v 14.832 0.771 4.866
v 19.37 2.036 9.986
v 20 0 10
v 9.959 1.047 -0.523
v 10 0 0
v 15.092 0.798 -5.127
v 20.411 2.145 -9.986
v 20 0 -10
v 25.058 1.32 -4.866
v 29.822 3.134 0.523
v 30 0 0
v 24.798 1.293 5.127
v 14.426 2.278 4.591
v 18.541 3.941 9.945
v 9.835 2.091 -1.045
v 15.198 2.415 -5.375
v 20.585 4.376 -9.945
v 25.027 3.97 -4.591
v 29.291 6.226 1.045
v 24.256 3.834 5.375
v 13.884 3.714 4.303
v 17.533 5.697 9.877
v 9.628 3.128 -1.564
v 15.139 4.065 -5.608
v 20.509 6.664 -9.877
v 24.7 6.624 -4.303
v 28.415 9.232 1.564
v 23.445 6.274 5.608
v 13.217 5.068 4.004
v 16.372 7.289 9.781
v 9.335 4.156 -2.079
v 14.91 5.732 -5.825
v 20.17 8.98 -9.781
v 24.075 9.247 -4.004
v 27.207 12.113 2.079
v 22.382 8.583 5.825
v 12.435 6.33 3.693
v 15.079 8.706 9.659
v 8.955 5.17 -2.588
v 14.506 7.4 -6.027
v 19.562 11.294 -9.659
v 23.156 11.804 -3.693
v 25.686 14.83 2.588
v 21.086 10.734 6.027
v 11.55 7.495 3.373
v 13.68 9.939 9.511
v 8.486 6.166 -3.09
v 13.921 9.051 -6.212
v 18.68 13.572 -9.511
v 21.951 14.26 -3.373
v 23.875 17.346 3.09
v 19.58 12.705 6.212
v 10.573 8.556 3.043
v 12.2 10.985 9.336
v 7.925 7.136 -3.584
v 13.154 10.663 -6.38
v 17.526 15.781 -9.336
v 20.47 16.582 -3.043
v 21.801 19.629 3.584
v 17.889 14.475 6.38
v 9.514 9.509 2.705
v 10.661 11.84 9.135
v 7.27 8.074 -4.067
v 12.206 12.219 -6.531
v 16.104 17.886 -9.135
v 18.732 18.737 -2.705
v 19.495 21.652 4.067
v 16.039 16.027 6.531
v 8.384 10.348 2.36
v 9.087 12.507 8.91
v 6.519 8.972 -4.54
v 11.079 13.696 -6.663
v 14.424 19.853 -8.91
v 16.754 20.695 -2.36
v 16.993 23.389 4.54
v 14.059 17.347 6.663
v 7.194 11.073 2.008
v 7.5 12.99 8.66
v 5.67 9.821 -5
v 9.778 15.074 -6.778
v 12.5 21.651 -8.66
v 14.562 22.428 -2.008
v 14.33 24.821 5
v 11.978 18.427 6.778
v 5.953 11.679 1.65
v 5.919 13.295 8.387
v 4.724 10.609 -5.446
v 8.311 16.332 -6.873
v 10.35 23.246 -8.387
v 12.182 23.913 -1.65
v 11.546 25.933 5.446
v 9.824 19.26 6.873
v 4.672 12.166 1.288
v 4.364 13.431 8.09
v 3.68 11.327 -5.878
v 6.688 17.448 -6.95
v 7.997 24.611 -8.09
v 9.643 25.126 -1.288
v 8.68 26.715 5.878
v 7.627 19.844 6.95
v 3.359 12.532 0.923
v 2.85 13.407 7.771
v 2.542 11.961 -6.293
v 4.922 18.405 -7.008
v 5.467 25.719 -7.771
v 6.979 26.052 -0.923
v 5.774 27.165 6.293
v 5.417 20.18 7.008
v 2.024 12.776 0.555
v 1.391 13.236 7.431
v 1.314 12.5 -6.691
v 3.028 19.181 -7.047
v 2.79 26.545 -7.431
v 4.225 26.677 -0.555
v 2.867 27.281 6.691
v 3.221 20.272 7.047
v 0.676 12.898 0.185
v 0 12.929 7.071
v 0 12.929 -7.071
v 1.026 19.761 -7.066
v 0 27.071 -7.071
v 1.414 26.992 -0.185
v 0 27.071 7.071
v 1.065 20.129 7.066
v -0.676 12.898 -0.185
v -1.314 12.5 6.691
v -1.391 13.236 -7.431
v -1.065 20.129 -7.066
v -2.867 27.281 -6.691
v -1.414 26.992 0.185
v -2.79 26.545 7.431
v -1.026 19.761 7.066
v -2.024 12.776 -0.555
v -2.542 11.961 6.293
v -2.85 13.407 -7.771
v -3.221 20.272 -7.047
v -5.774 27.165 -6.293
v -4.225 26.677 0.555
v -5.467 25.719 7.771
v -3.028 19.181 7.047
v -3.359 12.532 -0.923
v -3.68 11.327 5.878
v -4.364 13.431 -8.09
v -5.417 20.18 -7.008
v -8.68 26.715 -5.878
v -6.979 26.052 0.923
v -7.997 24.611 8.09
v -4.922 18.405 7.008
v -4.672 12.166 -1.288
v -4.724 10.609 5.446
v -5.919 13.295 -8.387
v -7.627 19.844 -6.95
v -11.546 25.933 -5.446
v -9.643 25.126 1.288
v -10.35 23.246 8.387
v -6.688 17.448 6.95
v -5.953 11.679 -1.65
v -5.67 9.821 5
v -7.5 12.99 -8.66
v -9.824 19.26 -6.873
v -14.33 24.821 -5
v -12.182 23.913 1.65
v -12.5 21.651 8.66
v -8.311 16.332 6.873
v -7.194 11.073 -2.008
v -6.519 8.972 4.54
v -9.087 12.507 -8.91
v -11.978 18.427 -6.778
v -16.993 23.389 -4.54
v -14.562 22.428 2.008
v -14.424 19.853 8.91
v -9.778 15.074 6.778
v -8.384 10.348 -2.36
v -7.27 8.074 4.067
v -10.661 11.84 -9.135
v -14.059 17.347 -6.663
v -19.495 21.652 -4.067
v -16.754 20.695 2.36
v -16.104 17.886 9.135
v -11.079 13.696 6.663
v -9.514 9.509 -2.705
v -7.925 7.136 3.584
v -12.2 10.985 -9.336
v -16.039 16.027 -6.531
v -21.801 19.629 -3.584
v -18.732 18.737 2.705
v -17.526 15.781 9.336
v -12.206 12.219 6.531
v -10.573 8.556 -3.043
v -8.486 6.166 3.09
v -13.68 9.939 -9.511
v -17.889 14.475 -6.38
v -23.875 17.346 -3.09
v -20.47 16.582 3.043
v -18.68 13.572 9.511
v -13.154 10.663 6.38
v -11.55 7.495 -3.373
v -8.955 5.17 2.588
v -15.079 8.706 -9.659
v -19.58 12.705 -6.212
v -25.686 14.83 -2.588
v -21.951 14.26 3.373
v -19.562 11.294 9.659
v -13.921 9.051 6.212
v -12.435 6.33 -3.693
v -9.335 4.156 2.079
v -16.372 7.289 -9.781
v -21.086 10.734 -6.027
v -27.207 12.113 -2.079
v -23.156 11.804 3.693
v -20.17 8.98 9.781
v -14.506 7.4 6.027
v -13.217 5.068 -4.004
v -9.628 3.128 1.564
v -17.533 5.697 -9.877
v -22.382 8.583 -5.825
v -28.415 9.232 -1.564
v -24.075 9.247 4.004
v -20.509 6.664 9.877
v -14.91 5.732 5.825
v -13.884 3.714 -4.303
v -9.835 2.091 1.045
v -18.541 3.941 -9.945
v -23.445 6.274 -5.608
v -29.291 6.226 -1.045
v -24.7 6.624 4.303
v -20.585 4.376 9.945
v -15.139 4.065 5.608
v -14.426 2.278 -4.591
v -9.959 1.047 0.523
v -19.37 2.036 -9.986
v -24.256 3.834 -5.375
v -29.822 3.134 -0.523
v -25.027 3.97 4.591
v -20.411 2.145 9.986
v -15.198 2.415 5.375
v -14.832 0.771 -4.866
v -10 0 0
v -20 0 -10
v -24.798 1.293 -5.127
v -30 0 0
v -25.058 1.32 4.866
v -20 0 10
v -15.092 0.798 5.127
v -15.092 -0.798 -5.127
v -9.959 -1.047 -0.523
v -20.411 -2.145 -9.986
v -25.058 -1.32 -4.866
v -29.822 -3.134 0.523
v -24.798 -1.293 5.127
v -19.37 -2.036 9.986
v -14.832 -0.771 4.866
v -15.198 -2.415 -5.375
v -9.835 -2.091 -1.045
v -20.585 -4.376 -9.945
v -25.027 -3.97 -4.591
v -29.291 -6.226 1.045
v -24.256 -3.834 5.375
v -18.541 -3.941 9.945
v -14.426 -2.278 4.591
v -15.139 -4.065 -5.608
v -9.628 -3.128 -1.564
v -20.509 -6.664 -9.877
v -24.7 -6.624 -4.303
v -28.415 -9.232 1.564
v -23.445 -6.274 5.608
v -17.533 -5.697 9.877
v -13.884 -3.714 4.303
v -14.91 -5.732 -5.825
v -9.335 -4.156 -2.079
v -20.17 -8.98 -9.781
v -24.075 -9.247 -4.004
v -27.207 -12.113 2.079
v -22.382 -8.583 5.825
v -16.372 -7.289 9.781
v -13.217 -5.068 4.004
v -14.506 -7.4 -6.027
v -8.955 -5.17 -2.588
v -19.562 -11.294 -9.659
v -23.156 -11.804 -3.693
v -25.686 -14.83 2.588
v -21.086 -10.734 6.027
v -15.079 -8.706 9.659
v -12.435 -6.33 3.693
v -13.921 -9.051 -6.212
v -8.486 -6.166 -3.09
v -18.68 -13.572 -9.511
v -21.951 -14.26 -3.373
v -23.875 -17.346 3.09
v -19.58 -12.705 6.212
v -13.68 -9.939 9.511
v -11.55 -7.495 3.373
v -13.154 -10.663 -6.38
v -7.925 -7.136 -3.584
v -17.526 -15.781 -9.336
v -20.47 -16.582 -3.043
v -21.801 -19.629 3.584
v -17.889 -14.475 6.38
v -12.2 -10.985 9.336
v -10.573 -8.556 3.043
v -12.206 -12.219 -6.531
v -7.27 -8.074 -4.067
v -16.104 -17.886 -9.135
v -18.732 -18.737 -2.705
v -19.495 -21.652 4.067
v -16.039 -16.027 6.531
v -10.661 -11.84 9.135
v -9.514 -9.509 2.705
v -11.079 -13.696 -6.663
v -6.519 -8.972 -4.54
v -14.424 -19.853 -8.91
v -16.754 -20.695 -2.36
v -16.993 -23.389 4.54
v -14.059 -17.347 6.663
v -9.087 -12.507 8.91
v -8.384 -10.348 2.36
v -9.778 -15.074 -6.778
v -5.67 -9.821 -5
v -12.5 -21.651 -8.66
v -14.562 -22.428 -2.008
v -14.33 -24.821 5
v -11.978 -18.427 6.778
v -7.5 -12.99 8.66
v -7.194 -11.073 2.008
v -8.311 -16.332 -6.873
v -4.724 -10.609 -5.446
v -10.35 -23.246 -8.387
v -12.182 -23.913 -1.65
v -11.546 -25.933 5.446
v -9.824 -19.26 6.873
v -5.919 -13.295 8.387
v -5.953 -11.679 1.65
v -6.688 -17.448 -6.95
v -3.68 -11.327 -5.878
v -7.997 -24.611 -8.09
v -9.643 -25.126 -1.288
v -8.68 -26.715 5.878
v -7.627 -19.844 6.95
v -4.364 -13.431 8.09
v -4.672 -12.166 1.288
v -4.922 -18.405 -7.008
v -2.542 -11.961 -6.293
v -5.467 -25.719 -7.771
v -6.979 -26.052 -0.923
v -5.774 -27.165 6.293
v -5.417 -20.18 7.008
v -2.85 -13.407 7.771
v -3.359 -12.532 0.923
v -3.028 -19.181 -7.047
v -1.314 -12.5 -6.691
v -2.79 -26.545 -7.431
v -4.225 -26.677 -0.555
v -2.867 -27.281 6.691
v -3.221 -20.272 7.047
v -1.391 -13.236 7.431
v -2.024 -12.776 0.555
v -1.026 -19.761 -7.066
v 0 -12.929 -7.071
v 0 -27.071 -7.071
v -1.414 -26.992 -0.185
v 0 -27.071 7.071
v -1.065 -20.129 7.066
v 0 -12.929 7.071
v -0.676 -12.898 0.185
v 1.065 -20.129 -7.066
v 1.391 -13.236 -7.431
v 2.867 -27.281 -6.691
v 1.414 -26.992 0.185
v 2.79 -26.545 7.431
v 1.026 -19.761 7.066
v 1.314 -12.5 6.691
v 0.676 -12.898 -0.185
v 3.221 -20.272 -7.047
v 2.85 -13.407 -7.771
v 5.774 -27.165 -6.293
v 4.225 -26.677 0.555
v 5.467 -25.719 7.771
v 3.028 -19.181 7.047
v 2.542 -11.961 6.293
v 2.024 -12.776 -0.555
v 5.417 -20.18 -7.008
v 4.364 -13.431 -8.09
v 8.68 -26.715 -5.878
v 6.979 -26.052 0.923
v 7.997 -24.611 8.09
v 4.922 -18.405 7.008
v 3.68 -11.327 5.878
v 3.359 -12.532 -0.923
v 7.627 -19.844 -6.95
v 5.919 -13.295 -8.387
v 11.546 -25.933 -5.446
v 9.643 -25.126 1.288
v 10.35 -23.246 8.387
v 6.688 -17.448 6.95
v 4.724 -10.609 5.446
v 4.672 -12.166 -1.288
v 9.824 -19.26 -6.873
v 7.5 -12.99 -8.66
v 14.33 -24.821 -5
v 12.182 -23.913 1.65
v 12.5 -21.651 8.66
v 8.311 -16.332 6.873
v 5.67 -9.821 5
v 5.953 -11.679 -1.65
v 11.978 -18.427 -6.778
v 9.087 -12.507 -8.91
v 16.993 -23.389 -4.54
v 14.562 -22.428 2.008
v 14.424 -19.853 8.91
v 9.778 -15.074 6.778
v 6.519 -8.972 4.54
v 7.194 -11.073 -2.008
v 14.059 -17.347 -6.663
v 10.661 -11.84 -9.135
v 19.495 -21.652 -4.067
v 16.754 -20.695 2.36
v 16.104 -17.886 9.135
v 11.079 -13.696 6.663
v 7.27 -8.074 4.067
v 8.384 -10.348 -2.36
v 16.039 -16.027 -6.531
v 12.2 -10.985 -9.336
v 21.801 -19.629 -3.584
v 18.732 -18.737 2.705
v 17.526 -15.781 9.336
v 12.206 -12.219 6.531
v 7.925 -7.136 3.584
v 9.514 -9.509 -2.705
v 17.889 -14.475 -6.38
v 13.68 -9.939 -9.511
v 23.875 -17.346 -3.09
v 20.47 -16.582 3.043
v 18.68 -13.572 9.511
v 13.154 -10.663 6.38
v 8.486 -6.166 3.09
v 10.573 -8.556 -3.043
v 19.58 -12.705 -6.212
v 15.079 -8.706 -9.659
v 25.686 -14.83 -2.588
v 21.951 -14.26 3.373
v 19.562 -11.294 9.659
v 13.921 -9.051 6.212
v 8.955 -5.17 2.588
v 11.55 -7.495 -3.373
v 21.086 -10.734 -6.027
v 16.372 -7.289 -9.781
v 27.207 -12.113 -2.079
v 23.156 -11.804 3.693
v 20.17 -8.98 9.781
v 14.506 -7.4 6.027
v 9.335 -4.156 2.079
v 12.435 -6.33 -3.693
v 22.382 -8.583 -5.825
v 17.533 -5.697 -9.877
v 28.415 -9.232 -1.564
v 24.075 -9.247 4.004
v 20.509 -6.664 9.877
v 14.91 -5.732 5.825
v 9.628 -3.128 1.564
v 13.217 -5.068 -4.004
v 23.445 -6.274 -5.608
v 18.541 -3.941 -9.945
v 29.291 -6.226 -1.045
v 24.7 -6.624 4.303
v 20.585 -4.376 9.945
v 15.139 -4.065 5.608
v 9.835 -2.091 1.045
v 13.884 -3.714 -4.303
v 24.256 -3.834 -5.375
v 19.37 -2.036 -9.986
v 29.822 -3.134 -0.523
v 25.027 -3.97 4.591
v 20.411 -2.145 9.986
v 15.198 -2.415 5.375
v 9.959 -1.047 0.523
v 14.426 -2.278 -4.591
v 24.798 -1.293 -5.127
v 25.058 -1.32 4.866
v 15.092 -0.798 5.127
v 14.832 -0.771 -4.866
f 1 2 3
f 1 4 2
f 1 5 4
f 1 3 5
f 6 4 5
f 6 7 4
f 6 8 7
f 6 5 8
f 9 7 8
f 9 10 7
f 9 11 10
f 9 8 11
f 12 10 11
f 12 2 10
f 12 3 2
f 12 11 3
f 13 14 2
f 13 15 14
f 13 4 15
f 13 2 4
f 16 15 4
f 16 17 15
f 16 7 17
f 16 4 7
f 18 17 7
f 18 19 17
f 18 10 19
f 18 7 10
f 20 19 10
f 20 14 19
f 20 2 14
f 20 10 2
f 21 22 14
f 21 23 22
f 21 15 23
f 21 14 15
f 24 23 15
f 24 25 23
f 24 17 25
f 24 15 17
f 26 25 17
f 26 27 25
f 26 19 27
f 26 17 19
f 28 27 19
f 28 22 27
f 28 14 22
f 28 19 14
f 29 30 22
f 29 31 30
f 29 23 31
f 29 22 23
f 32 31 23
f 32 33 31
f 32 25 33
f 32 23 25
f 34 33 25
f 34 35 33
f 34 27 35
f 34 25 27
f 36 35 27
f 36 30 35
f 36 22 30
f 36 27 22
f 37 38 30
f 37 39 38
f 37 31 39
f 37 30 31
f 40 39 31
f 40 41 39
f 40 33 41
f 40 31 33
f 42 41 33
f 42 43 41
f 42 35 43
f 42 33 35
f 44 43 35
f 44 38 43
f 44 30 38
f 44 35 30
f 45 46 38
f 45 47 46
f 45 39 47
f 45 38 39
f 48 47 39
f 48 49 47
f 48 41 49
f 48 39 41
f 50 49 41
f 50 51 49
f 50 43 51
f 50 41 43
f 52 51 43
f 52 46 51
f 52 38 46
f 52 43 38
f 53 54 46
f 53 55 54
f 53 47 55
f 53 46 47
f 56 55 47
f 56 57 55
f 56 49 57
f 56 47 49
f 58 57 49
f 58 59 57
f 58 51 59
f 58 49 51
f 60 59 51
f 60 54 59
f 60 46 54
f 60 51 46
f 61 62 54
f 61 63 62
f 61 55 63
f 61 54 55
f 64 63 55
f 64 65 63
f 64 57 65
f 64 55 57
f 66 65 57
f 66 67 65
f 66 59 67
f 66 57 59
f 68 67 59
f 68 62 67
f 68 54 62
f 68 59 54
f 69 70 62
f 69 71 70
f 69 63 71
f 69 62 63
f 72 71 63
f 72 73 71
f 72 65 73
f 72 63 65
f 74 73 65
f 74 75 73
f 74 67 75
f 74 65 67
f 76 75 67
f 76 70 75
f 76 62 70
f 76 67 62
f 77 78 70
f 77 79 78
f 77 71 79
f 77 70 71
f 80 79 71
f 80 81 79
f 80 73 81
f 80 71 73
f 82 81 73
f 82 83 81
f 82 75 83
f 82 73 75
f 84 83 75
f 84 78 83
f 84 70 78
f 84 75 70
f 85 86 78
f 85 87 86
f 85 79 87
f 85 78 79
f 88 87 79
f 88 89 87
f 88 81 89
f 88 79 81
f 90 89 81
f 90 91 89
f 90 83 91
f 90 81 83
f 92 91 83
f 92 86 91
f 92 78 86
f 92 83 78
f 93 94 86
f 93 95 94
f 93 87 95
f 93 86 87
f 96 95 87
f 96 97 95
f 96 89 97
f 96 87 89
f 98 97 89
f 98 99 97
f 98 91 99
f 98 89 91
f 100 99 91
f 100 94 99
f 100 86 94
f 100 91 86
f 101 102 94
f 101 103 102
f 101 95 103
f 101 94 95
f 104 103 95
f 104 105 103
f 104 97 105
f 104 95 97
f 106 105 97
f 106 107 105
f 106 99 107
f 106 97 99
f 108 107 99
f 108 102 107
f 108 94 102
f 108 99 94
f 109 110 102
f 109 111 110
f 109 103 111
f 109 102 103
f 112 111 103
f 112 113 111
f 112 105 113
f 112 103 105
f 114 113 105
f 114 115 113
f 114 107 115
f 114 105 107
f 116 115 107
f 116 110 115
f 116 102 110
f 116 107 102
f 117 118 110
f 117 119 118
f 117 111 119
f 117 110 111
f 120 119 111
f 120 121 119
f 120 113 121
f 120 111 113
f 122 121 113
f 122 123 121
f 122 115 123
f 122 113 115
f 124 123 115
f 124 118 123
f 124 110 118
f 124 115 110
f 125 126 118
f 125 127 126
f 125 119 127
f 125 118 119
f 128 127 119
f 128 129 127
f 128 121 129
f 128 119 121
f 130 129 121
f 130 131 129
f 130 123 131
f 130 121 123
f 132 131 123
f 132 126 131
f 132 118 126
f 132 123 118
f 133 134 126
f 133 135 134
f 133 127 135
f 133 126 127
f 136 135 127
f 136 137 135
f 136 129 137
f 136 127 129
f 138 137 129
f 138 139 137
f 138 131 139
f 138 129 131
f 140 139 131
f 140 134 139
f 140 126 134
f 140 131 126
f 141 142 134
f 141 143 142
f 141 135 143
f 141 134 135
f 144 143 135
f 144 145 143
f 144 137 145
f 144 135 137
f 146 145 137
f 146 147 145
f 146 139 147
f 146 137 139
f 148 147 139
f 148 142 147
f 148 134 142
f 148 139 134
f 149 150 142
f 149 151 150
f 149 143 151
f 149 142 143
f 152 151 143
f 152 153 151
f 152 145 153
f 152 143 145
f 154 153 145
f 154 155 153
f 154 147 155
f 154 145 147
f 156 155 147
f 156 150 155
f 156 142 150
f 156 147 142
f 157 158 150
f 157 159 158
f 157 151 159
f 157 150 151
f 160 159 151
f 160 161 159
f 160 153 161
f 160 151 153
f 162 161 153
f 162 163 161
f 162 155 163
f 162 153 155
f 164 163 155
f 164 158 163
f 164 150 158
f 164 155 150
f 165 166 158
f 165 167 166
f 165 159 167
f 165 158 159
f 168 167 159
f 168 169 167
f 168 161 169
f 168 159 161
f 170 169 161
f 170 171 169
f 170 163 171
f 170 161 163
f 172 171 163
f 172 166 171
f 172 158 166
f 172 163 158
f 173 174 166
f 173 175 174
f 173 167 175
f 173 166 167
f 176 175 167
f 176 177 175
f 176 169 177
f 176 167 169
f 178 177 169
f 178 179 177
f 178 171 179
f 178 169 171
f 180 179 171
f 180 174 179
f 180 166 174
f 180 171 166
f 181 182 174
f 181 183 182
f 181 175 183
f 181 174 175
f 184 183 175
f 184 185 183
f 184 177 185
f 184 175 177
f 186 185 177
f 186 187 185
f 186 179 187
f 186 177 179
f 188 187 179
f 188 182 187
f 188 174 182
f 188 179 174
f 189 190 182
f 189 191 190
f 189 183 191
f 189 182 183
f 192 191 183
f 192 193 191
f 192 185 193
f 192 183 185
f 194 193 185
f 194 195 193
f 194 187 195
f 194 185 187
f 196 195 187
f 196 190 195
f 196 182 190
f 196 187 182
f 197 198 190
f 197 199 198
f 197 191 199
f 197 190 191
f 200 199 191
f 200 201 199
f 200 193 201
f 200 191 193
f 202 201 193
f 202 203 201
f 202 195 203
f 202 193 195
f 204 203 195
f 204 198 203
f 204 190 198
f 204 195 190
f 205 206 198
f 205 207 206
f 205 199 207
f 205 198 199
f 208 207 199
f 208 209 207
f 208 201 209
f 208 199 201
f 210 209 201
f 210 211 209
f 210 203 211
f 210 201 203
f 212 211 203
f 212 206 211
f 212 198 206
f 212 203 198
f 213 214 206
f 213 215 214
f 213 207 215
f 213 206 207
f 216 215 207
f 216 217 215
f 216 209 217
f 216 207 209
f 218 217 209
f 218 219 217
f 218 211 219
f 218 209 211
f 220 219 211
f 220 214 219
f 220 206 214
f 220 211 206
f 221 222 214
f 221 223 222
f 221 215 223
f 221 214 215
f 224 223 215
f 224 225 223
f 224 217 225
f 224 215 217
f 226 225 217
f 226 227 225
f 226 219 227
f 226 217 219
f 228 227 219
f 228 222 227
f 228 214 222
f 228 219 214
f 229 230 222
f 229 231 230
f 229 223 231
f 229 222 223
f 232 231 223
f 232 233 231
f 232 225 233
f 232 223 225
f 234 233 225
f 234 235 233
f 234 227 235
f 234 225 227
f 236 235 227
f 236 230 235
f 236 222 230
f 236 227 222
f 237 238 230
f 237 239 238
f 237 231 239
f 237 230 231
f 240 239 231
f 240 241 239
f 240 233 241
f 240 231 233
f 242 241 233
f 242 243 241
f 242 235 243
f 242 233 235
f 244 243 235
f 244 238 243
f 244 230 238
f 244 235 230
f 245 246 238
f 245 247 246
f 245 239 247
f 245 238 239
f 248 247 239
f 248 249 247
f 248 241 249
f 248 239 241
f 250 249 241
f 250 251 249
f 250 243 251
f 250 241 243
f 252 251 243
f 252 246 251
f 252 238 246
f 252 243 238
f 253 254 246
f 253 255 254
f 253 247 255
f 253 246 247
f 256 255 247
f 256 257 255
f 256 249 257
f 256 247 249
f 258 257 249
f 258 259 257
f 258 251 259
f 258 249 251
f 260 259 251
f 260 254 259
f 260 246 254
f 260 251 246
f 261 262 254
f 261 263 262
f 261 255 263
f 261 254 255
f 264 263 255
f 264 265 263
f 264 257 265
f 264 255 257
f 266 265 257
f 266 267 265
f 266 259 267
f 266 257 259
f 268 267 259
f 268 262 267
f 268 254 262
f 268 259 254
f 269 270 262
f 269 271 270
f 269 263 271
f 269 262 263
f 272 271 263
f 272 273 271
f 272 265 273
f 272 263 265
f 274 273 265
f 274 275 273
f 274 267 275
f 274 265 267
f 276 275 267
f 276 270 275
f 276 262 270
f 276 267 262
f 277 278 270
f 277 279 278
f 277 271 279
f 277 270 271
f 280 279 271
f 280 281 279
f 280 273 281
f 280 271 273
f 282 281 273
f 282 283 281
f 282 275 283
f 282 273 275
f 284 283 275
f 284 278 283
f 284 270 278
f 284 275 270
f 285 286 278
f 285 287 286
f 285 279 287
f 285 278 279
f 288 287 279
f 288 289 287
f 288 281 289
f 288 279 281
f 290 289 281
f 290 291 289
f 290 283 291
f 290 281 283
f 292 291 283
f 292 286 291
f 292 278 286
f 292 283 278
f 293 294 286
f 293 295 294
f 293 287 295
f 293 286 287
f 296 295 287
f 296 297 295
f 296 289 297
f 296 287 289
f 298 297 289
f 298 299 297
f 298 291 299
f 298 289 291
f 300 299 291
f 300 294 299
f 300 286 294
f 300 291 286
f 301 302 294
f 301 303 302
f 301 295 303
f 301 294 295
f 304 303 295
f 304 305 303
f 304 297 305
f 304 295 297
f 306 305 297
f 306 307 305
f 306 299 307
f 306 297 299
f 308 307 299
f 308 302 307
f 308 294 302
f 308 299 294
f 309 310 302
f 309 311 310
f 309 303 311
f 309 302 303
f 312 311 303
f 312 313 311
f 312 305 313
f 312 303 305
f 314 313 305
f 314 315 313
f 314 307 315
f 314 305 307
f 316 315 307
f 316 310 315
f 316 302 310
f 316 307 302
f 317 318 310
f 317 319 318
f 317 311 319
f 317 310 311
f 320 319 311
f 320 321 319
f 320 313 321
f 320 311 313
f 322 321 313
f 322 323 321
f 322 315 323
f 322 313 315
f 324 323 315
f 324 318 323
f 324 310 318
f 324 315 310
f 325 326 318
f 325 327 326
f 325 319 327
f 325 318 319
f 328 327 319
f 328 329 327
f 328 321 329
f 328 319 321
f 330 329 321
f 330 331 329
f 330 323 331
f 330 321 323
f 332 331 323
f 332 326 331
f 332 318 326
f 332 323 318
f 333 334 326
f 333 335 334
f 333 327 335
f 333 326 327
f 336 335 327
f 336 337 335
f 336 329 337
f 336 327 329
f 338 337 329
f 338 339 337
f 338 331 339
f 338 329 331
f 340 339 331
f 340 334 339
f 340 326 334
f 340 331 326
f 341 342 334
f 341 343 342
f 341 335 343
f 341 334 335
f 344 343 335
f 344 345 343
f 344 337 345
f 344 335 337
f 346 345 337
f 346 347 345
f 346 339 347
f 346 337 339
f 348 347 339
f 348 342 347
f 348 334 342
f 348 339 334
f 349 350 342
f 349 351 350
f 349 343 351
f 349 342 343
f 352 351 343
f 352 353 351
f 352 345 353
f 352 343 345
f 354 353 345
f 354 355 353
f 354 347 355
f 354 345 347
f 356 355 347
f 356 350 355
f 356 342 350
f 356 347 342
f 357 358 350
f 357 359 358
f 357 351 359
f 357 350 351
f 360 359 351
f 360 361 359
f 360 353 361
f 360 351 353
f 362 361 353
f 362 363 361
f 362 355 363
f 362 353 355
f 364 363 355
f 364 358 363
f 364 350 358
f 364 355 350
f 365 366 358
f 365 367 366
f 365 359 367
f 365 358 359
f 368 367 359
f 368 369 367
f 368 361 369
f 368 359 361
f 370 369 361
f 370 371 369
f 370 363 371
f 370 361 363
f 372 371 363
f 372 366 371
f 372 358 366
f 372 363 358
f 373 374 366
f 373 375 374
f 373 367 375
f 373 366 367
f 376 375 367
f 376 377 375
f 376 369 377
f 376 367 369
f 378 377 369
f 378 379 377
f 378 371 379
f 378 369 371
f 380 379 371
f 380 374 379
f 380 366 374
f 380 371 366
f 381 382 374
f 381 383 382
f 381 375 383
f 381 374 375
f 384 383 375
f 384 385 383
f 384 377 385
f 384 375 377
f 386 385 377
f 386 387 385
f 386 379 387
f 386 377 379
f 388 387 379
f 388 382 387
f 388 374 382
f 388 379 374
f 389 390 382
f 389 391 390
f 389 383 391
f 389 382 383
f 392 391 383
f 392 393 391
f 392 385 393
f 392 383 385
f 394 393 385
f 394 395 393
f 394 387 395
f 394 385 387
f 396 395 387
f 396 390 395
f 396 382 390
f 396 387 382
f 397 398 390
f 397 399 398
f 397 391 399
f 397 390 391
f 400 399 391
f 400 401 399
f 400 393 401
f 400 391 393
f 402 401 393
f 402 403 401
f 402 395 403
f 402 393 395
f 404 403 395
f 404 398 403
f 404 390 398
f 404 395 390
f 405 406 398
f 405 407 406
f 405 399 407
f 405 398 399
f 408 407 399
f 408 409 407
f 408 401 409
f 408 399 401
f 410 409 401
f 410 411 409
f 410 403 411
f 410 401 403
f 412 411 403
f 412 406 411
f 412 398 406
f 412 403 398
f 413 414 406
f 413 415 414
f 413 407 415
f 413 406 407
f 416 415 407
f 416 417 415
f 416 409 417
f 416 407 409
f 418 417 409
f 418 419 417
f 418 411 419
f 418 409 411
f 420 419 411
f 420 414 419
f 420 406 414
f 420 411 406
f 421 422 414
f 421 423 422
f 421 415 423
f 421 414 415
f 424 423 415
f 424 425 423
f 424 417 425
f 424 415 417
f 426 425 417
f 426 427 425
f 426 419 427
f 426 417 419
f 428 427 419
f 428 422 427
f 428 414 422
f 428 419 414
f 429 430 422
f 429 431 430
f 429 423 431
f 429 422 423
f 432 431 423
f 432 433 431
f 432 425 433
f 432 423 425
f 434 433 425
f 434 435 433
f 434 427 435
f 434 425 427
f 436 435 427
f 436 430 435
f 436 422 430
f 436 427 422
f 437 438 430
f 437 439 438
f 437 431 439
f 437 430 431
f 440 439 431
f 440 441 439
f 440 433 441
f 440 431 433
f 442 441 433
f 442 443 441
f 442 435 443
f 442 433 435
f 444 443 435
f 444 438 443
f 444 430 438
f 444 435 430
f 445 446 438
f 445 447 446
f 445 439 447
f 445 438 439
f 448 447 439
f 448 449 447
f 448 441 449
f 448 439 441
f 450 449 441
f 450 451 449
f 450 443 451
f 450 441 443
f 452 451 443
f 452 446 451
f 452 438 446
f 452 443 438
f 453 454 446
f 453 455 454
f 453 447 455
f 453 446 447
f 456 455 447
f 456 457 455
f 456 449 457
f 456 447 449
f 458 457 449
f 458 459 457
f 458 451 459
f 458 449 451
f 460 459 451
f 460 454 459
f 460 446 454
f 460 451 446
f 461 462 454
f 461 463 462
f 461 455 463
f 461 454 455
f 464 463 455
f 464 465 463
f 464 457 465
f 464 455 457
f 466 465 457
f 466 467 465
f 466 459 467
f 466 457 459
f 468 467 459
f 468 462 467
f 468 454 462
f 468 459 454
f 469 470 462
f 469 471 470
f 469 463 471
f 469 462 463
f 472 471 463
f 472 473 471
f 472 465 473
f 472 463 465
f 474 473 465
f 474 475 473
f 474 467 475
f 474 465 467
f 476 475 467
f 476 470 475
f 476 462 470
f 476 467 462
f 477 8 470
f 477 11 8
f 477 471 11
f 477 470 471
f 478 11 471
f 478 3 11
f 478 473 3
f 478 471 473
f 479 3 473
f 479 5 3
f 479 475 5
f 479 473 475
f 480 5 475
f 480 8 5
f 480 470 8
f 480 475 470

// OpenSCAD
// file: ../pcurve.scad
// Parametrize a star-convex curve by t=theta/360.
// The first point in the polygon becomes t=0.
function polar_parametrize(points,center=[0,0]) =
	let (p0=points[0], a0=atan2(p0[1]-center[1],p0[0]-center[0]))
	[ for (p=concat(points,[p0]))
	[ (atan2(p[1]-center[1],p[0]-center[0])-a0+720)%360/360, p ] ];

// Measure [partial] perimeter of polygon, through first n edges.
function perimeter(points,n=undef) =
	is_undef(n) ? perimeter(points,len(points)) :
	n==0 ? 0 :
	perimeter(points,n-1) + norm(points[n==len(points)?0:n]-points[n-1]);

// Parametrize an arbitrary curve by fraction of perimeter.
function length_parametrize(points) =
	let (total=perimeter(points)) [
	for (i=[0:1:len(points)-1]) [ perimeter(points,i)/total, points[i] ],
	[1, points[0]]];

// Parametrize an arbitrary curve by point index.
function indexed_parametrize(points,center=[0,0]) = [
	for (i=[0:1:len(points)-1]) [ i/len(points), points[i] ] ];

// Transform a parametrized curve in 2- or 3-space via an affine transformation
// matrix. Produces a parametrized curve in 3-space.
function transform_curve(M,c) = [ for (p=c) [ p[0],
	[[1,0,0,0],[0,1,0,0],[0,0,1,0]]*M*[p[1][0],p[1][1],is_undef(p[1][2])?0:p[1][2],1]
	] ];

// Produce a non-parametrized regular n-gon with first vertex on y axis.
function regular_ngon(n,r) = [ for (i=[0:1:n-1]) [-r*sin(360*i/n),r*cos(360*i/n),0] ];


// Matrix for rotation around an axis. Default is z-axis. If first argument
// is a vector, elements are sequential rotations around each axis.
function R(a,v=[0,0,1]) =
	!is_num(a) ? R(a[0],[1,0,0])*R(a[1],[0,1,0])*R(a[2],[0,0,1]) :
	let (id=[[1,0,0,0],[0,1,0,0],[0,0,1,0],[0,0,0,1]],
	vcross=[[0,-v[2],v[1],0],[v[2],0,-v[0],0],[-v[1],v[0],0,0], [0,0,0,0]],
	vouter=[for (i=[0:2]) [for (j=[0:2]) v[i]*v[j],0], [0,0,0,1]])
	cos(a)*id + sin(a)*vcross + (1-cos(a))*vouter;

// Matrix for translation. Scalars are along the z axis.
function T(v=[0,0,0]) = is_num(v) ? T([0,0,v]) :
	[[1,0,0,v[0]],[0,1,0,v[1]],[0,0,1,v[2]],[0,0,0,1]];

// Matrix for scaling (dilation). Scalar applies same to each axis;
// vector scales each axis separately.
function S(k=1) = is_num(k) ? S([k,k,k]) :
	[[k[0],0,0,0],[0,k[1],0,0],[0,0,k[2],0],[0,0,0,1]];
// file: ../loft.scad
// Sort a list of numbers.
function qsort(l) = len(l)<=1 ? l : concat(
	qsort([ for (x=l) if (x<l[0]) x ]),
	[ for (x=l) if (x==l[0]) x ],
	qsort([ for (x=l) if (x>l[0]) x]));

// Collapse runs of duplicates from a list.
function uniq(l) = [ l[0], for (i=[1:1:len(l)-1]) if (l[i]!=l[i-1]) l[i] ];

// Project on the i'th axis so lookup() can be used.
function curve_prj(c,i) = [ for (v=c) [v[0],v[1][i]] ];

// Establish periodicity of lookup() by extending to <=0 and >=1 as needed.
function curve_extend(c) = [
	if (c[0][0]>0) [c[len(c)-1][0]-1,c[len(c)-1][1]],
	for (p=c) p,
	if (c[len(c)-1][0]<1) [c[0][0]+1,c[0][1]] ];

// Evaluate curve at parameter t using lookup() to interpolate.
function curve_pt(c,t) = let(
	a=curve_extend(c))
	[ lookup(t,curve_prj(a,0)), lookup(t,curve_prj(a,1)), lookup(t,curve_prj(a,2)) ];

// Interpolate parametric curves to produce a new parametric curve.
function curve_morph(c1,c2,s) =
	let(partition = uniq(qsort([ 0, for (c=[c1,c2], p=c) p[0], 1 ])))
	[ for (t=partition) [ t,(1-s)*curve_pt(c1,t) + s*curve_pt(c2,t) ] ];

// Internal core function for loft operation.
module loft_core(curves,cap_start=false,cap_end=false) {
	partition = uniq(qsort([ for (c=curves, v=c) v[0], 1 ]));
	m = len(curves);
	n = len(partition);
	edge_points = [ for (c=curves, t=partition) curve_pt(c,t) ];
	center_points = [ for (k=[0:len(curves)-1], j=[0:1:n-2])
		(edge_points[n*k+j] + edge_points[n*(k+1)+j+1] +
		 edge_points[n*(k+1)+j] + edge_points[n*k+j+1])/4 ];
	points = [ for (p=edge_points) p, for (p=center_points) p ];
	c0 = len(edge_points);
	faces = [
		for (k=[0:1:len(curves)-2], j=[0:n-2],
			v=[ [k*n+j, (k+1)*n+j, c0+k*(n-1)+j],
			    [(k+1)*n+j, (k+1)*n+j+1, c0+k*(n-1)+j],
			    [(k+1)*n+j+1, k*n+j+1, c0+k*(n-1)+j],
			    [k*n+j+1, k*n+j, c0+k*(n-1)+j] ]) v,
		if (cap_start) [ for (j=[n-2:-1:0]) j ],
		if (cap_end) [ for (j=[0:1:n-2]) n*(m-1)+j ],
	];
	polyhedron(points=points,faces=faces,convexity=20);
}

// Produce a polyhedron-type object by applying a loft operation to
// a list of parametric curves, linking points in successive curves with
// the same value of the parameter. If the first or last curve is planar,
// it can be made into an end-cap surface by putting an empty curve []
// before or after it. Otherwise, either the first and last curves must
// be the same, producing a loop, or they must be degenerate (single points).
module loft(curves) {
	loft_core(
		curves = [for (c=curves) if (len(c)>0) c],
		cap_start = len(curves[0])==0,
		cap_end = len(curves[len(curves)-1])==0
	);
}
// main file
use <../loft.scad>;
use <../pcurve.scad>;


loft([
	for (i=[0:6:360])
		transform_curve(
			R(i)*T([20,0,0])*R(90,[1,0,0])*R(i/2),
			length_parametrize(regular_ngon(n=4,r=10))
		)
]);
